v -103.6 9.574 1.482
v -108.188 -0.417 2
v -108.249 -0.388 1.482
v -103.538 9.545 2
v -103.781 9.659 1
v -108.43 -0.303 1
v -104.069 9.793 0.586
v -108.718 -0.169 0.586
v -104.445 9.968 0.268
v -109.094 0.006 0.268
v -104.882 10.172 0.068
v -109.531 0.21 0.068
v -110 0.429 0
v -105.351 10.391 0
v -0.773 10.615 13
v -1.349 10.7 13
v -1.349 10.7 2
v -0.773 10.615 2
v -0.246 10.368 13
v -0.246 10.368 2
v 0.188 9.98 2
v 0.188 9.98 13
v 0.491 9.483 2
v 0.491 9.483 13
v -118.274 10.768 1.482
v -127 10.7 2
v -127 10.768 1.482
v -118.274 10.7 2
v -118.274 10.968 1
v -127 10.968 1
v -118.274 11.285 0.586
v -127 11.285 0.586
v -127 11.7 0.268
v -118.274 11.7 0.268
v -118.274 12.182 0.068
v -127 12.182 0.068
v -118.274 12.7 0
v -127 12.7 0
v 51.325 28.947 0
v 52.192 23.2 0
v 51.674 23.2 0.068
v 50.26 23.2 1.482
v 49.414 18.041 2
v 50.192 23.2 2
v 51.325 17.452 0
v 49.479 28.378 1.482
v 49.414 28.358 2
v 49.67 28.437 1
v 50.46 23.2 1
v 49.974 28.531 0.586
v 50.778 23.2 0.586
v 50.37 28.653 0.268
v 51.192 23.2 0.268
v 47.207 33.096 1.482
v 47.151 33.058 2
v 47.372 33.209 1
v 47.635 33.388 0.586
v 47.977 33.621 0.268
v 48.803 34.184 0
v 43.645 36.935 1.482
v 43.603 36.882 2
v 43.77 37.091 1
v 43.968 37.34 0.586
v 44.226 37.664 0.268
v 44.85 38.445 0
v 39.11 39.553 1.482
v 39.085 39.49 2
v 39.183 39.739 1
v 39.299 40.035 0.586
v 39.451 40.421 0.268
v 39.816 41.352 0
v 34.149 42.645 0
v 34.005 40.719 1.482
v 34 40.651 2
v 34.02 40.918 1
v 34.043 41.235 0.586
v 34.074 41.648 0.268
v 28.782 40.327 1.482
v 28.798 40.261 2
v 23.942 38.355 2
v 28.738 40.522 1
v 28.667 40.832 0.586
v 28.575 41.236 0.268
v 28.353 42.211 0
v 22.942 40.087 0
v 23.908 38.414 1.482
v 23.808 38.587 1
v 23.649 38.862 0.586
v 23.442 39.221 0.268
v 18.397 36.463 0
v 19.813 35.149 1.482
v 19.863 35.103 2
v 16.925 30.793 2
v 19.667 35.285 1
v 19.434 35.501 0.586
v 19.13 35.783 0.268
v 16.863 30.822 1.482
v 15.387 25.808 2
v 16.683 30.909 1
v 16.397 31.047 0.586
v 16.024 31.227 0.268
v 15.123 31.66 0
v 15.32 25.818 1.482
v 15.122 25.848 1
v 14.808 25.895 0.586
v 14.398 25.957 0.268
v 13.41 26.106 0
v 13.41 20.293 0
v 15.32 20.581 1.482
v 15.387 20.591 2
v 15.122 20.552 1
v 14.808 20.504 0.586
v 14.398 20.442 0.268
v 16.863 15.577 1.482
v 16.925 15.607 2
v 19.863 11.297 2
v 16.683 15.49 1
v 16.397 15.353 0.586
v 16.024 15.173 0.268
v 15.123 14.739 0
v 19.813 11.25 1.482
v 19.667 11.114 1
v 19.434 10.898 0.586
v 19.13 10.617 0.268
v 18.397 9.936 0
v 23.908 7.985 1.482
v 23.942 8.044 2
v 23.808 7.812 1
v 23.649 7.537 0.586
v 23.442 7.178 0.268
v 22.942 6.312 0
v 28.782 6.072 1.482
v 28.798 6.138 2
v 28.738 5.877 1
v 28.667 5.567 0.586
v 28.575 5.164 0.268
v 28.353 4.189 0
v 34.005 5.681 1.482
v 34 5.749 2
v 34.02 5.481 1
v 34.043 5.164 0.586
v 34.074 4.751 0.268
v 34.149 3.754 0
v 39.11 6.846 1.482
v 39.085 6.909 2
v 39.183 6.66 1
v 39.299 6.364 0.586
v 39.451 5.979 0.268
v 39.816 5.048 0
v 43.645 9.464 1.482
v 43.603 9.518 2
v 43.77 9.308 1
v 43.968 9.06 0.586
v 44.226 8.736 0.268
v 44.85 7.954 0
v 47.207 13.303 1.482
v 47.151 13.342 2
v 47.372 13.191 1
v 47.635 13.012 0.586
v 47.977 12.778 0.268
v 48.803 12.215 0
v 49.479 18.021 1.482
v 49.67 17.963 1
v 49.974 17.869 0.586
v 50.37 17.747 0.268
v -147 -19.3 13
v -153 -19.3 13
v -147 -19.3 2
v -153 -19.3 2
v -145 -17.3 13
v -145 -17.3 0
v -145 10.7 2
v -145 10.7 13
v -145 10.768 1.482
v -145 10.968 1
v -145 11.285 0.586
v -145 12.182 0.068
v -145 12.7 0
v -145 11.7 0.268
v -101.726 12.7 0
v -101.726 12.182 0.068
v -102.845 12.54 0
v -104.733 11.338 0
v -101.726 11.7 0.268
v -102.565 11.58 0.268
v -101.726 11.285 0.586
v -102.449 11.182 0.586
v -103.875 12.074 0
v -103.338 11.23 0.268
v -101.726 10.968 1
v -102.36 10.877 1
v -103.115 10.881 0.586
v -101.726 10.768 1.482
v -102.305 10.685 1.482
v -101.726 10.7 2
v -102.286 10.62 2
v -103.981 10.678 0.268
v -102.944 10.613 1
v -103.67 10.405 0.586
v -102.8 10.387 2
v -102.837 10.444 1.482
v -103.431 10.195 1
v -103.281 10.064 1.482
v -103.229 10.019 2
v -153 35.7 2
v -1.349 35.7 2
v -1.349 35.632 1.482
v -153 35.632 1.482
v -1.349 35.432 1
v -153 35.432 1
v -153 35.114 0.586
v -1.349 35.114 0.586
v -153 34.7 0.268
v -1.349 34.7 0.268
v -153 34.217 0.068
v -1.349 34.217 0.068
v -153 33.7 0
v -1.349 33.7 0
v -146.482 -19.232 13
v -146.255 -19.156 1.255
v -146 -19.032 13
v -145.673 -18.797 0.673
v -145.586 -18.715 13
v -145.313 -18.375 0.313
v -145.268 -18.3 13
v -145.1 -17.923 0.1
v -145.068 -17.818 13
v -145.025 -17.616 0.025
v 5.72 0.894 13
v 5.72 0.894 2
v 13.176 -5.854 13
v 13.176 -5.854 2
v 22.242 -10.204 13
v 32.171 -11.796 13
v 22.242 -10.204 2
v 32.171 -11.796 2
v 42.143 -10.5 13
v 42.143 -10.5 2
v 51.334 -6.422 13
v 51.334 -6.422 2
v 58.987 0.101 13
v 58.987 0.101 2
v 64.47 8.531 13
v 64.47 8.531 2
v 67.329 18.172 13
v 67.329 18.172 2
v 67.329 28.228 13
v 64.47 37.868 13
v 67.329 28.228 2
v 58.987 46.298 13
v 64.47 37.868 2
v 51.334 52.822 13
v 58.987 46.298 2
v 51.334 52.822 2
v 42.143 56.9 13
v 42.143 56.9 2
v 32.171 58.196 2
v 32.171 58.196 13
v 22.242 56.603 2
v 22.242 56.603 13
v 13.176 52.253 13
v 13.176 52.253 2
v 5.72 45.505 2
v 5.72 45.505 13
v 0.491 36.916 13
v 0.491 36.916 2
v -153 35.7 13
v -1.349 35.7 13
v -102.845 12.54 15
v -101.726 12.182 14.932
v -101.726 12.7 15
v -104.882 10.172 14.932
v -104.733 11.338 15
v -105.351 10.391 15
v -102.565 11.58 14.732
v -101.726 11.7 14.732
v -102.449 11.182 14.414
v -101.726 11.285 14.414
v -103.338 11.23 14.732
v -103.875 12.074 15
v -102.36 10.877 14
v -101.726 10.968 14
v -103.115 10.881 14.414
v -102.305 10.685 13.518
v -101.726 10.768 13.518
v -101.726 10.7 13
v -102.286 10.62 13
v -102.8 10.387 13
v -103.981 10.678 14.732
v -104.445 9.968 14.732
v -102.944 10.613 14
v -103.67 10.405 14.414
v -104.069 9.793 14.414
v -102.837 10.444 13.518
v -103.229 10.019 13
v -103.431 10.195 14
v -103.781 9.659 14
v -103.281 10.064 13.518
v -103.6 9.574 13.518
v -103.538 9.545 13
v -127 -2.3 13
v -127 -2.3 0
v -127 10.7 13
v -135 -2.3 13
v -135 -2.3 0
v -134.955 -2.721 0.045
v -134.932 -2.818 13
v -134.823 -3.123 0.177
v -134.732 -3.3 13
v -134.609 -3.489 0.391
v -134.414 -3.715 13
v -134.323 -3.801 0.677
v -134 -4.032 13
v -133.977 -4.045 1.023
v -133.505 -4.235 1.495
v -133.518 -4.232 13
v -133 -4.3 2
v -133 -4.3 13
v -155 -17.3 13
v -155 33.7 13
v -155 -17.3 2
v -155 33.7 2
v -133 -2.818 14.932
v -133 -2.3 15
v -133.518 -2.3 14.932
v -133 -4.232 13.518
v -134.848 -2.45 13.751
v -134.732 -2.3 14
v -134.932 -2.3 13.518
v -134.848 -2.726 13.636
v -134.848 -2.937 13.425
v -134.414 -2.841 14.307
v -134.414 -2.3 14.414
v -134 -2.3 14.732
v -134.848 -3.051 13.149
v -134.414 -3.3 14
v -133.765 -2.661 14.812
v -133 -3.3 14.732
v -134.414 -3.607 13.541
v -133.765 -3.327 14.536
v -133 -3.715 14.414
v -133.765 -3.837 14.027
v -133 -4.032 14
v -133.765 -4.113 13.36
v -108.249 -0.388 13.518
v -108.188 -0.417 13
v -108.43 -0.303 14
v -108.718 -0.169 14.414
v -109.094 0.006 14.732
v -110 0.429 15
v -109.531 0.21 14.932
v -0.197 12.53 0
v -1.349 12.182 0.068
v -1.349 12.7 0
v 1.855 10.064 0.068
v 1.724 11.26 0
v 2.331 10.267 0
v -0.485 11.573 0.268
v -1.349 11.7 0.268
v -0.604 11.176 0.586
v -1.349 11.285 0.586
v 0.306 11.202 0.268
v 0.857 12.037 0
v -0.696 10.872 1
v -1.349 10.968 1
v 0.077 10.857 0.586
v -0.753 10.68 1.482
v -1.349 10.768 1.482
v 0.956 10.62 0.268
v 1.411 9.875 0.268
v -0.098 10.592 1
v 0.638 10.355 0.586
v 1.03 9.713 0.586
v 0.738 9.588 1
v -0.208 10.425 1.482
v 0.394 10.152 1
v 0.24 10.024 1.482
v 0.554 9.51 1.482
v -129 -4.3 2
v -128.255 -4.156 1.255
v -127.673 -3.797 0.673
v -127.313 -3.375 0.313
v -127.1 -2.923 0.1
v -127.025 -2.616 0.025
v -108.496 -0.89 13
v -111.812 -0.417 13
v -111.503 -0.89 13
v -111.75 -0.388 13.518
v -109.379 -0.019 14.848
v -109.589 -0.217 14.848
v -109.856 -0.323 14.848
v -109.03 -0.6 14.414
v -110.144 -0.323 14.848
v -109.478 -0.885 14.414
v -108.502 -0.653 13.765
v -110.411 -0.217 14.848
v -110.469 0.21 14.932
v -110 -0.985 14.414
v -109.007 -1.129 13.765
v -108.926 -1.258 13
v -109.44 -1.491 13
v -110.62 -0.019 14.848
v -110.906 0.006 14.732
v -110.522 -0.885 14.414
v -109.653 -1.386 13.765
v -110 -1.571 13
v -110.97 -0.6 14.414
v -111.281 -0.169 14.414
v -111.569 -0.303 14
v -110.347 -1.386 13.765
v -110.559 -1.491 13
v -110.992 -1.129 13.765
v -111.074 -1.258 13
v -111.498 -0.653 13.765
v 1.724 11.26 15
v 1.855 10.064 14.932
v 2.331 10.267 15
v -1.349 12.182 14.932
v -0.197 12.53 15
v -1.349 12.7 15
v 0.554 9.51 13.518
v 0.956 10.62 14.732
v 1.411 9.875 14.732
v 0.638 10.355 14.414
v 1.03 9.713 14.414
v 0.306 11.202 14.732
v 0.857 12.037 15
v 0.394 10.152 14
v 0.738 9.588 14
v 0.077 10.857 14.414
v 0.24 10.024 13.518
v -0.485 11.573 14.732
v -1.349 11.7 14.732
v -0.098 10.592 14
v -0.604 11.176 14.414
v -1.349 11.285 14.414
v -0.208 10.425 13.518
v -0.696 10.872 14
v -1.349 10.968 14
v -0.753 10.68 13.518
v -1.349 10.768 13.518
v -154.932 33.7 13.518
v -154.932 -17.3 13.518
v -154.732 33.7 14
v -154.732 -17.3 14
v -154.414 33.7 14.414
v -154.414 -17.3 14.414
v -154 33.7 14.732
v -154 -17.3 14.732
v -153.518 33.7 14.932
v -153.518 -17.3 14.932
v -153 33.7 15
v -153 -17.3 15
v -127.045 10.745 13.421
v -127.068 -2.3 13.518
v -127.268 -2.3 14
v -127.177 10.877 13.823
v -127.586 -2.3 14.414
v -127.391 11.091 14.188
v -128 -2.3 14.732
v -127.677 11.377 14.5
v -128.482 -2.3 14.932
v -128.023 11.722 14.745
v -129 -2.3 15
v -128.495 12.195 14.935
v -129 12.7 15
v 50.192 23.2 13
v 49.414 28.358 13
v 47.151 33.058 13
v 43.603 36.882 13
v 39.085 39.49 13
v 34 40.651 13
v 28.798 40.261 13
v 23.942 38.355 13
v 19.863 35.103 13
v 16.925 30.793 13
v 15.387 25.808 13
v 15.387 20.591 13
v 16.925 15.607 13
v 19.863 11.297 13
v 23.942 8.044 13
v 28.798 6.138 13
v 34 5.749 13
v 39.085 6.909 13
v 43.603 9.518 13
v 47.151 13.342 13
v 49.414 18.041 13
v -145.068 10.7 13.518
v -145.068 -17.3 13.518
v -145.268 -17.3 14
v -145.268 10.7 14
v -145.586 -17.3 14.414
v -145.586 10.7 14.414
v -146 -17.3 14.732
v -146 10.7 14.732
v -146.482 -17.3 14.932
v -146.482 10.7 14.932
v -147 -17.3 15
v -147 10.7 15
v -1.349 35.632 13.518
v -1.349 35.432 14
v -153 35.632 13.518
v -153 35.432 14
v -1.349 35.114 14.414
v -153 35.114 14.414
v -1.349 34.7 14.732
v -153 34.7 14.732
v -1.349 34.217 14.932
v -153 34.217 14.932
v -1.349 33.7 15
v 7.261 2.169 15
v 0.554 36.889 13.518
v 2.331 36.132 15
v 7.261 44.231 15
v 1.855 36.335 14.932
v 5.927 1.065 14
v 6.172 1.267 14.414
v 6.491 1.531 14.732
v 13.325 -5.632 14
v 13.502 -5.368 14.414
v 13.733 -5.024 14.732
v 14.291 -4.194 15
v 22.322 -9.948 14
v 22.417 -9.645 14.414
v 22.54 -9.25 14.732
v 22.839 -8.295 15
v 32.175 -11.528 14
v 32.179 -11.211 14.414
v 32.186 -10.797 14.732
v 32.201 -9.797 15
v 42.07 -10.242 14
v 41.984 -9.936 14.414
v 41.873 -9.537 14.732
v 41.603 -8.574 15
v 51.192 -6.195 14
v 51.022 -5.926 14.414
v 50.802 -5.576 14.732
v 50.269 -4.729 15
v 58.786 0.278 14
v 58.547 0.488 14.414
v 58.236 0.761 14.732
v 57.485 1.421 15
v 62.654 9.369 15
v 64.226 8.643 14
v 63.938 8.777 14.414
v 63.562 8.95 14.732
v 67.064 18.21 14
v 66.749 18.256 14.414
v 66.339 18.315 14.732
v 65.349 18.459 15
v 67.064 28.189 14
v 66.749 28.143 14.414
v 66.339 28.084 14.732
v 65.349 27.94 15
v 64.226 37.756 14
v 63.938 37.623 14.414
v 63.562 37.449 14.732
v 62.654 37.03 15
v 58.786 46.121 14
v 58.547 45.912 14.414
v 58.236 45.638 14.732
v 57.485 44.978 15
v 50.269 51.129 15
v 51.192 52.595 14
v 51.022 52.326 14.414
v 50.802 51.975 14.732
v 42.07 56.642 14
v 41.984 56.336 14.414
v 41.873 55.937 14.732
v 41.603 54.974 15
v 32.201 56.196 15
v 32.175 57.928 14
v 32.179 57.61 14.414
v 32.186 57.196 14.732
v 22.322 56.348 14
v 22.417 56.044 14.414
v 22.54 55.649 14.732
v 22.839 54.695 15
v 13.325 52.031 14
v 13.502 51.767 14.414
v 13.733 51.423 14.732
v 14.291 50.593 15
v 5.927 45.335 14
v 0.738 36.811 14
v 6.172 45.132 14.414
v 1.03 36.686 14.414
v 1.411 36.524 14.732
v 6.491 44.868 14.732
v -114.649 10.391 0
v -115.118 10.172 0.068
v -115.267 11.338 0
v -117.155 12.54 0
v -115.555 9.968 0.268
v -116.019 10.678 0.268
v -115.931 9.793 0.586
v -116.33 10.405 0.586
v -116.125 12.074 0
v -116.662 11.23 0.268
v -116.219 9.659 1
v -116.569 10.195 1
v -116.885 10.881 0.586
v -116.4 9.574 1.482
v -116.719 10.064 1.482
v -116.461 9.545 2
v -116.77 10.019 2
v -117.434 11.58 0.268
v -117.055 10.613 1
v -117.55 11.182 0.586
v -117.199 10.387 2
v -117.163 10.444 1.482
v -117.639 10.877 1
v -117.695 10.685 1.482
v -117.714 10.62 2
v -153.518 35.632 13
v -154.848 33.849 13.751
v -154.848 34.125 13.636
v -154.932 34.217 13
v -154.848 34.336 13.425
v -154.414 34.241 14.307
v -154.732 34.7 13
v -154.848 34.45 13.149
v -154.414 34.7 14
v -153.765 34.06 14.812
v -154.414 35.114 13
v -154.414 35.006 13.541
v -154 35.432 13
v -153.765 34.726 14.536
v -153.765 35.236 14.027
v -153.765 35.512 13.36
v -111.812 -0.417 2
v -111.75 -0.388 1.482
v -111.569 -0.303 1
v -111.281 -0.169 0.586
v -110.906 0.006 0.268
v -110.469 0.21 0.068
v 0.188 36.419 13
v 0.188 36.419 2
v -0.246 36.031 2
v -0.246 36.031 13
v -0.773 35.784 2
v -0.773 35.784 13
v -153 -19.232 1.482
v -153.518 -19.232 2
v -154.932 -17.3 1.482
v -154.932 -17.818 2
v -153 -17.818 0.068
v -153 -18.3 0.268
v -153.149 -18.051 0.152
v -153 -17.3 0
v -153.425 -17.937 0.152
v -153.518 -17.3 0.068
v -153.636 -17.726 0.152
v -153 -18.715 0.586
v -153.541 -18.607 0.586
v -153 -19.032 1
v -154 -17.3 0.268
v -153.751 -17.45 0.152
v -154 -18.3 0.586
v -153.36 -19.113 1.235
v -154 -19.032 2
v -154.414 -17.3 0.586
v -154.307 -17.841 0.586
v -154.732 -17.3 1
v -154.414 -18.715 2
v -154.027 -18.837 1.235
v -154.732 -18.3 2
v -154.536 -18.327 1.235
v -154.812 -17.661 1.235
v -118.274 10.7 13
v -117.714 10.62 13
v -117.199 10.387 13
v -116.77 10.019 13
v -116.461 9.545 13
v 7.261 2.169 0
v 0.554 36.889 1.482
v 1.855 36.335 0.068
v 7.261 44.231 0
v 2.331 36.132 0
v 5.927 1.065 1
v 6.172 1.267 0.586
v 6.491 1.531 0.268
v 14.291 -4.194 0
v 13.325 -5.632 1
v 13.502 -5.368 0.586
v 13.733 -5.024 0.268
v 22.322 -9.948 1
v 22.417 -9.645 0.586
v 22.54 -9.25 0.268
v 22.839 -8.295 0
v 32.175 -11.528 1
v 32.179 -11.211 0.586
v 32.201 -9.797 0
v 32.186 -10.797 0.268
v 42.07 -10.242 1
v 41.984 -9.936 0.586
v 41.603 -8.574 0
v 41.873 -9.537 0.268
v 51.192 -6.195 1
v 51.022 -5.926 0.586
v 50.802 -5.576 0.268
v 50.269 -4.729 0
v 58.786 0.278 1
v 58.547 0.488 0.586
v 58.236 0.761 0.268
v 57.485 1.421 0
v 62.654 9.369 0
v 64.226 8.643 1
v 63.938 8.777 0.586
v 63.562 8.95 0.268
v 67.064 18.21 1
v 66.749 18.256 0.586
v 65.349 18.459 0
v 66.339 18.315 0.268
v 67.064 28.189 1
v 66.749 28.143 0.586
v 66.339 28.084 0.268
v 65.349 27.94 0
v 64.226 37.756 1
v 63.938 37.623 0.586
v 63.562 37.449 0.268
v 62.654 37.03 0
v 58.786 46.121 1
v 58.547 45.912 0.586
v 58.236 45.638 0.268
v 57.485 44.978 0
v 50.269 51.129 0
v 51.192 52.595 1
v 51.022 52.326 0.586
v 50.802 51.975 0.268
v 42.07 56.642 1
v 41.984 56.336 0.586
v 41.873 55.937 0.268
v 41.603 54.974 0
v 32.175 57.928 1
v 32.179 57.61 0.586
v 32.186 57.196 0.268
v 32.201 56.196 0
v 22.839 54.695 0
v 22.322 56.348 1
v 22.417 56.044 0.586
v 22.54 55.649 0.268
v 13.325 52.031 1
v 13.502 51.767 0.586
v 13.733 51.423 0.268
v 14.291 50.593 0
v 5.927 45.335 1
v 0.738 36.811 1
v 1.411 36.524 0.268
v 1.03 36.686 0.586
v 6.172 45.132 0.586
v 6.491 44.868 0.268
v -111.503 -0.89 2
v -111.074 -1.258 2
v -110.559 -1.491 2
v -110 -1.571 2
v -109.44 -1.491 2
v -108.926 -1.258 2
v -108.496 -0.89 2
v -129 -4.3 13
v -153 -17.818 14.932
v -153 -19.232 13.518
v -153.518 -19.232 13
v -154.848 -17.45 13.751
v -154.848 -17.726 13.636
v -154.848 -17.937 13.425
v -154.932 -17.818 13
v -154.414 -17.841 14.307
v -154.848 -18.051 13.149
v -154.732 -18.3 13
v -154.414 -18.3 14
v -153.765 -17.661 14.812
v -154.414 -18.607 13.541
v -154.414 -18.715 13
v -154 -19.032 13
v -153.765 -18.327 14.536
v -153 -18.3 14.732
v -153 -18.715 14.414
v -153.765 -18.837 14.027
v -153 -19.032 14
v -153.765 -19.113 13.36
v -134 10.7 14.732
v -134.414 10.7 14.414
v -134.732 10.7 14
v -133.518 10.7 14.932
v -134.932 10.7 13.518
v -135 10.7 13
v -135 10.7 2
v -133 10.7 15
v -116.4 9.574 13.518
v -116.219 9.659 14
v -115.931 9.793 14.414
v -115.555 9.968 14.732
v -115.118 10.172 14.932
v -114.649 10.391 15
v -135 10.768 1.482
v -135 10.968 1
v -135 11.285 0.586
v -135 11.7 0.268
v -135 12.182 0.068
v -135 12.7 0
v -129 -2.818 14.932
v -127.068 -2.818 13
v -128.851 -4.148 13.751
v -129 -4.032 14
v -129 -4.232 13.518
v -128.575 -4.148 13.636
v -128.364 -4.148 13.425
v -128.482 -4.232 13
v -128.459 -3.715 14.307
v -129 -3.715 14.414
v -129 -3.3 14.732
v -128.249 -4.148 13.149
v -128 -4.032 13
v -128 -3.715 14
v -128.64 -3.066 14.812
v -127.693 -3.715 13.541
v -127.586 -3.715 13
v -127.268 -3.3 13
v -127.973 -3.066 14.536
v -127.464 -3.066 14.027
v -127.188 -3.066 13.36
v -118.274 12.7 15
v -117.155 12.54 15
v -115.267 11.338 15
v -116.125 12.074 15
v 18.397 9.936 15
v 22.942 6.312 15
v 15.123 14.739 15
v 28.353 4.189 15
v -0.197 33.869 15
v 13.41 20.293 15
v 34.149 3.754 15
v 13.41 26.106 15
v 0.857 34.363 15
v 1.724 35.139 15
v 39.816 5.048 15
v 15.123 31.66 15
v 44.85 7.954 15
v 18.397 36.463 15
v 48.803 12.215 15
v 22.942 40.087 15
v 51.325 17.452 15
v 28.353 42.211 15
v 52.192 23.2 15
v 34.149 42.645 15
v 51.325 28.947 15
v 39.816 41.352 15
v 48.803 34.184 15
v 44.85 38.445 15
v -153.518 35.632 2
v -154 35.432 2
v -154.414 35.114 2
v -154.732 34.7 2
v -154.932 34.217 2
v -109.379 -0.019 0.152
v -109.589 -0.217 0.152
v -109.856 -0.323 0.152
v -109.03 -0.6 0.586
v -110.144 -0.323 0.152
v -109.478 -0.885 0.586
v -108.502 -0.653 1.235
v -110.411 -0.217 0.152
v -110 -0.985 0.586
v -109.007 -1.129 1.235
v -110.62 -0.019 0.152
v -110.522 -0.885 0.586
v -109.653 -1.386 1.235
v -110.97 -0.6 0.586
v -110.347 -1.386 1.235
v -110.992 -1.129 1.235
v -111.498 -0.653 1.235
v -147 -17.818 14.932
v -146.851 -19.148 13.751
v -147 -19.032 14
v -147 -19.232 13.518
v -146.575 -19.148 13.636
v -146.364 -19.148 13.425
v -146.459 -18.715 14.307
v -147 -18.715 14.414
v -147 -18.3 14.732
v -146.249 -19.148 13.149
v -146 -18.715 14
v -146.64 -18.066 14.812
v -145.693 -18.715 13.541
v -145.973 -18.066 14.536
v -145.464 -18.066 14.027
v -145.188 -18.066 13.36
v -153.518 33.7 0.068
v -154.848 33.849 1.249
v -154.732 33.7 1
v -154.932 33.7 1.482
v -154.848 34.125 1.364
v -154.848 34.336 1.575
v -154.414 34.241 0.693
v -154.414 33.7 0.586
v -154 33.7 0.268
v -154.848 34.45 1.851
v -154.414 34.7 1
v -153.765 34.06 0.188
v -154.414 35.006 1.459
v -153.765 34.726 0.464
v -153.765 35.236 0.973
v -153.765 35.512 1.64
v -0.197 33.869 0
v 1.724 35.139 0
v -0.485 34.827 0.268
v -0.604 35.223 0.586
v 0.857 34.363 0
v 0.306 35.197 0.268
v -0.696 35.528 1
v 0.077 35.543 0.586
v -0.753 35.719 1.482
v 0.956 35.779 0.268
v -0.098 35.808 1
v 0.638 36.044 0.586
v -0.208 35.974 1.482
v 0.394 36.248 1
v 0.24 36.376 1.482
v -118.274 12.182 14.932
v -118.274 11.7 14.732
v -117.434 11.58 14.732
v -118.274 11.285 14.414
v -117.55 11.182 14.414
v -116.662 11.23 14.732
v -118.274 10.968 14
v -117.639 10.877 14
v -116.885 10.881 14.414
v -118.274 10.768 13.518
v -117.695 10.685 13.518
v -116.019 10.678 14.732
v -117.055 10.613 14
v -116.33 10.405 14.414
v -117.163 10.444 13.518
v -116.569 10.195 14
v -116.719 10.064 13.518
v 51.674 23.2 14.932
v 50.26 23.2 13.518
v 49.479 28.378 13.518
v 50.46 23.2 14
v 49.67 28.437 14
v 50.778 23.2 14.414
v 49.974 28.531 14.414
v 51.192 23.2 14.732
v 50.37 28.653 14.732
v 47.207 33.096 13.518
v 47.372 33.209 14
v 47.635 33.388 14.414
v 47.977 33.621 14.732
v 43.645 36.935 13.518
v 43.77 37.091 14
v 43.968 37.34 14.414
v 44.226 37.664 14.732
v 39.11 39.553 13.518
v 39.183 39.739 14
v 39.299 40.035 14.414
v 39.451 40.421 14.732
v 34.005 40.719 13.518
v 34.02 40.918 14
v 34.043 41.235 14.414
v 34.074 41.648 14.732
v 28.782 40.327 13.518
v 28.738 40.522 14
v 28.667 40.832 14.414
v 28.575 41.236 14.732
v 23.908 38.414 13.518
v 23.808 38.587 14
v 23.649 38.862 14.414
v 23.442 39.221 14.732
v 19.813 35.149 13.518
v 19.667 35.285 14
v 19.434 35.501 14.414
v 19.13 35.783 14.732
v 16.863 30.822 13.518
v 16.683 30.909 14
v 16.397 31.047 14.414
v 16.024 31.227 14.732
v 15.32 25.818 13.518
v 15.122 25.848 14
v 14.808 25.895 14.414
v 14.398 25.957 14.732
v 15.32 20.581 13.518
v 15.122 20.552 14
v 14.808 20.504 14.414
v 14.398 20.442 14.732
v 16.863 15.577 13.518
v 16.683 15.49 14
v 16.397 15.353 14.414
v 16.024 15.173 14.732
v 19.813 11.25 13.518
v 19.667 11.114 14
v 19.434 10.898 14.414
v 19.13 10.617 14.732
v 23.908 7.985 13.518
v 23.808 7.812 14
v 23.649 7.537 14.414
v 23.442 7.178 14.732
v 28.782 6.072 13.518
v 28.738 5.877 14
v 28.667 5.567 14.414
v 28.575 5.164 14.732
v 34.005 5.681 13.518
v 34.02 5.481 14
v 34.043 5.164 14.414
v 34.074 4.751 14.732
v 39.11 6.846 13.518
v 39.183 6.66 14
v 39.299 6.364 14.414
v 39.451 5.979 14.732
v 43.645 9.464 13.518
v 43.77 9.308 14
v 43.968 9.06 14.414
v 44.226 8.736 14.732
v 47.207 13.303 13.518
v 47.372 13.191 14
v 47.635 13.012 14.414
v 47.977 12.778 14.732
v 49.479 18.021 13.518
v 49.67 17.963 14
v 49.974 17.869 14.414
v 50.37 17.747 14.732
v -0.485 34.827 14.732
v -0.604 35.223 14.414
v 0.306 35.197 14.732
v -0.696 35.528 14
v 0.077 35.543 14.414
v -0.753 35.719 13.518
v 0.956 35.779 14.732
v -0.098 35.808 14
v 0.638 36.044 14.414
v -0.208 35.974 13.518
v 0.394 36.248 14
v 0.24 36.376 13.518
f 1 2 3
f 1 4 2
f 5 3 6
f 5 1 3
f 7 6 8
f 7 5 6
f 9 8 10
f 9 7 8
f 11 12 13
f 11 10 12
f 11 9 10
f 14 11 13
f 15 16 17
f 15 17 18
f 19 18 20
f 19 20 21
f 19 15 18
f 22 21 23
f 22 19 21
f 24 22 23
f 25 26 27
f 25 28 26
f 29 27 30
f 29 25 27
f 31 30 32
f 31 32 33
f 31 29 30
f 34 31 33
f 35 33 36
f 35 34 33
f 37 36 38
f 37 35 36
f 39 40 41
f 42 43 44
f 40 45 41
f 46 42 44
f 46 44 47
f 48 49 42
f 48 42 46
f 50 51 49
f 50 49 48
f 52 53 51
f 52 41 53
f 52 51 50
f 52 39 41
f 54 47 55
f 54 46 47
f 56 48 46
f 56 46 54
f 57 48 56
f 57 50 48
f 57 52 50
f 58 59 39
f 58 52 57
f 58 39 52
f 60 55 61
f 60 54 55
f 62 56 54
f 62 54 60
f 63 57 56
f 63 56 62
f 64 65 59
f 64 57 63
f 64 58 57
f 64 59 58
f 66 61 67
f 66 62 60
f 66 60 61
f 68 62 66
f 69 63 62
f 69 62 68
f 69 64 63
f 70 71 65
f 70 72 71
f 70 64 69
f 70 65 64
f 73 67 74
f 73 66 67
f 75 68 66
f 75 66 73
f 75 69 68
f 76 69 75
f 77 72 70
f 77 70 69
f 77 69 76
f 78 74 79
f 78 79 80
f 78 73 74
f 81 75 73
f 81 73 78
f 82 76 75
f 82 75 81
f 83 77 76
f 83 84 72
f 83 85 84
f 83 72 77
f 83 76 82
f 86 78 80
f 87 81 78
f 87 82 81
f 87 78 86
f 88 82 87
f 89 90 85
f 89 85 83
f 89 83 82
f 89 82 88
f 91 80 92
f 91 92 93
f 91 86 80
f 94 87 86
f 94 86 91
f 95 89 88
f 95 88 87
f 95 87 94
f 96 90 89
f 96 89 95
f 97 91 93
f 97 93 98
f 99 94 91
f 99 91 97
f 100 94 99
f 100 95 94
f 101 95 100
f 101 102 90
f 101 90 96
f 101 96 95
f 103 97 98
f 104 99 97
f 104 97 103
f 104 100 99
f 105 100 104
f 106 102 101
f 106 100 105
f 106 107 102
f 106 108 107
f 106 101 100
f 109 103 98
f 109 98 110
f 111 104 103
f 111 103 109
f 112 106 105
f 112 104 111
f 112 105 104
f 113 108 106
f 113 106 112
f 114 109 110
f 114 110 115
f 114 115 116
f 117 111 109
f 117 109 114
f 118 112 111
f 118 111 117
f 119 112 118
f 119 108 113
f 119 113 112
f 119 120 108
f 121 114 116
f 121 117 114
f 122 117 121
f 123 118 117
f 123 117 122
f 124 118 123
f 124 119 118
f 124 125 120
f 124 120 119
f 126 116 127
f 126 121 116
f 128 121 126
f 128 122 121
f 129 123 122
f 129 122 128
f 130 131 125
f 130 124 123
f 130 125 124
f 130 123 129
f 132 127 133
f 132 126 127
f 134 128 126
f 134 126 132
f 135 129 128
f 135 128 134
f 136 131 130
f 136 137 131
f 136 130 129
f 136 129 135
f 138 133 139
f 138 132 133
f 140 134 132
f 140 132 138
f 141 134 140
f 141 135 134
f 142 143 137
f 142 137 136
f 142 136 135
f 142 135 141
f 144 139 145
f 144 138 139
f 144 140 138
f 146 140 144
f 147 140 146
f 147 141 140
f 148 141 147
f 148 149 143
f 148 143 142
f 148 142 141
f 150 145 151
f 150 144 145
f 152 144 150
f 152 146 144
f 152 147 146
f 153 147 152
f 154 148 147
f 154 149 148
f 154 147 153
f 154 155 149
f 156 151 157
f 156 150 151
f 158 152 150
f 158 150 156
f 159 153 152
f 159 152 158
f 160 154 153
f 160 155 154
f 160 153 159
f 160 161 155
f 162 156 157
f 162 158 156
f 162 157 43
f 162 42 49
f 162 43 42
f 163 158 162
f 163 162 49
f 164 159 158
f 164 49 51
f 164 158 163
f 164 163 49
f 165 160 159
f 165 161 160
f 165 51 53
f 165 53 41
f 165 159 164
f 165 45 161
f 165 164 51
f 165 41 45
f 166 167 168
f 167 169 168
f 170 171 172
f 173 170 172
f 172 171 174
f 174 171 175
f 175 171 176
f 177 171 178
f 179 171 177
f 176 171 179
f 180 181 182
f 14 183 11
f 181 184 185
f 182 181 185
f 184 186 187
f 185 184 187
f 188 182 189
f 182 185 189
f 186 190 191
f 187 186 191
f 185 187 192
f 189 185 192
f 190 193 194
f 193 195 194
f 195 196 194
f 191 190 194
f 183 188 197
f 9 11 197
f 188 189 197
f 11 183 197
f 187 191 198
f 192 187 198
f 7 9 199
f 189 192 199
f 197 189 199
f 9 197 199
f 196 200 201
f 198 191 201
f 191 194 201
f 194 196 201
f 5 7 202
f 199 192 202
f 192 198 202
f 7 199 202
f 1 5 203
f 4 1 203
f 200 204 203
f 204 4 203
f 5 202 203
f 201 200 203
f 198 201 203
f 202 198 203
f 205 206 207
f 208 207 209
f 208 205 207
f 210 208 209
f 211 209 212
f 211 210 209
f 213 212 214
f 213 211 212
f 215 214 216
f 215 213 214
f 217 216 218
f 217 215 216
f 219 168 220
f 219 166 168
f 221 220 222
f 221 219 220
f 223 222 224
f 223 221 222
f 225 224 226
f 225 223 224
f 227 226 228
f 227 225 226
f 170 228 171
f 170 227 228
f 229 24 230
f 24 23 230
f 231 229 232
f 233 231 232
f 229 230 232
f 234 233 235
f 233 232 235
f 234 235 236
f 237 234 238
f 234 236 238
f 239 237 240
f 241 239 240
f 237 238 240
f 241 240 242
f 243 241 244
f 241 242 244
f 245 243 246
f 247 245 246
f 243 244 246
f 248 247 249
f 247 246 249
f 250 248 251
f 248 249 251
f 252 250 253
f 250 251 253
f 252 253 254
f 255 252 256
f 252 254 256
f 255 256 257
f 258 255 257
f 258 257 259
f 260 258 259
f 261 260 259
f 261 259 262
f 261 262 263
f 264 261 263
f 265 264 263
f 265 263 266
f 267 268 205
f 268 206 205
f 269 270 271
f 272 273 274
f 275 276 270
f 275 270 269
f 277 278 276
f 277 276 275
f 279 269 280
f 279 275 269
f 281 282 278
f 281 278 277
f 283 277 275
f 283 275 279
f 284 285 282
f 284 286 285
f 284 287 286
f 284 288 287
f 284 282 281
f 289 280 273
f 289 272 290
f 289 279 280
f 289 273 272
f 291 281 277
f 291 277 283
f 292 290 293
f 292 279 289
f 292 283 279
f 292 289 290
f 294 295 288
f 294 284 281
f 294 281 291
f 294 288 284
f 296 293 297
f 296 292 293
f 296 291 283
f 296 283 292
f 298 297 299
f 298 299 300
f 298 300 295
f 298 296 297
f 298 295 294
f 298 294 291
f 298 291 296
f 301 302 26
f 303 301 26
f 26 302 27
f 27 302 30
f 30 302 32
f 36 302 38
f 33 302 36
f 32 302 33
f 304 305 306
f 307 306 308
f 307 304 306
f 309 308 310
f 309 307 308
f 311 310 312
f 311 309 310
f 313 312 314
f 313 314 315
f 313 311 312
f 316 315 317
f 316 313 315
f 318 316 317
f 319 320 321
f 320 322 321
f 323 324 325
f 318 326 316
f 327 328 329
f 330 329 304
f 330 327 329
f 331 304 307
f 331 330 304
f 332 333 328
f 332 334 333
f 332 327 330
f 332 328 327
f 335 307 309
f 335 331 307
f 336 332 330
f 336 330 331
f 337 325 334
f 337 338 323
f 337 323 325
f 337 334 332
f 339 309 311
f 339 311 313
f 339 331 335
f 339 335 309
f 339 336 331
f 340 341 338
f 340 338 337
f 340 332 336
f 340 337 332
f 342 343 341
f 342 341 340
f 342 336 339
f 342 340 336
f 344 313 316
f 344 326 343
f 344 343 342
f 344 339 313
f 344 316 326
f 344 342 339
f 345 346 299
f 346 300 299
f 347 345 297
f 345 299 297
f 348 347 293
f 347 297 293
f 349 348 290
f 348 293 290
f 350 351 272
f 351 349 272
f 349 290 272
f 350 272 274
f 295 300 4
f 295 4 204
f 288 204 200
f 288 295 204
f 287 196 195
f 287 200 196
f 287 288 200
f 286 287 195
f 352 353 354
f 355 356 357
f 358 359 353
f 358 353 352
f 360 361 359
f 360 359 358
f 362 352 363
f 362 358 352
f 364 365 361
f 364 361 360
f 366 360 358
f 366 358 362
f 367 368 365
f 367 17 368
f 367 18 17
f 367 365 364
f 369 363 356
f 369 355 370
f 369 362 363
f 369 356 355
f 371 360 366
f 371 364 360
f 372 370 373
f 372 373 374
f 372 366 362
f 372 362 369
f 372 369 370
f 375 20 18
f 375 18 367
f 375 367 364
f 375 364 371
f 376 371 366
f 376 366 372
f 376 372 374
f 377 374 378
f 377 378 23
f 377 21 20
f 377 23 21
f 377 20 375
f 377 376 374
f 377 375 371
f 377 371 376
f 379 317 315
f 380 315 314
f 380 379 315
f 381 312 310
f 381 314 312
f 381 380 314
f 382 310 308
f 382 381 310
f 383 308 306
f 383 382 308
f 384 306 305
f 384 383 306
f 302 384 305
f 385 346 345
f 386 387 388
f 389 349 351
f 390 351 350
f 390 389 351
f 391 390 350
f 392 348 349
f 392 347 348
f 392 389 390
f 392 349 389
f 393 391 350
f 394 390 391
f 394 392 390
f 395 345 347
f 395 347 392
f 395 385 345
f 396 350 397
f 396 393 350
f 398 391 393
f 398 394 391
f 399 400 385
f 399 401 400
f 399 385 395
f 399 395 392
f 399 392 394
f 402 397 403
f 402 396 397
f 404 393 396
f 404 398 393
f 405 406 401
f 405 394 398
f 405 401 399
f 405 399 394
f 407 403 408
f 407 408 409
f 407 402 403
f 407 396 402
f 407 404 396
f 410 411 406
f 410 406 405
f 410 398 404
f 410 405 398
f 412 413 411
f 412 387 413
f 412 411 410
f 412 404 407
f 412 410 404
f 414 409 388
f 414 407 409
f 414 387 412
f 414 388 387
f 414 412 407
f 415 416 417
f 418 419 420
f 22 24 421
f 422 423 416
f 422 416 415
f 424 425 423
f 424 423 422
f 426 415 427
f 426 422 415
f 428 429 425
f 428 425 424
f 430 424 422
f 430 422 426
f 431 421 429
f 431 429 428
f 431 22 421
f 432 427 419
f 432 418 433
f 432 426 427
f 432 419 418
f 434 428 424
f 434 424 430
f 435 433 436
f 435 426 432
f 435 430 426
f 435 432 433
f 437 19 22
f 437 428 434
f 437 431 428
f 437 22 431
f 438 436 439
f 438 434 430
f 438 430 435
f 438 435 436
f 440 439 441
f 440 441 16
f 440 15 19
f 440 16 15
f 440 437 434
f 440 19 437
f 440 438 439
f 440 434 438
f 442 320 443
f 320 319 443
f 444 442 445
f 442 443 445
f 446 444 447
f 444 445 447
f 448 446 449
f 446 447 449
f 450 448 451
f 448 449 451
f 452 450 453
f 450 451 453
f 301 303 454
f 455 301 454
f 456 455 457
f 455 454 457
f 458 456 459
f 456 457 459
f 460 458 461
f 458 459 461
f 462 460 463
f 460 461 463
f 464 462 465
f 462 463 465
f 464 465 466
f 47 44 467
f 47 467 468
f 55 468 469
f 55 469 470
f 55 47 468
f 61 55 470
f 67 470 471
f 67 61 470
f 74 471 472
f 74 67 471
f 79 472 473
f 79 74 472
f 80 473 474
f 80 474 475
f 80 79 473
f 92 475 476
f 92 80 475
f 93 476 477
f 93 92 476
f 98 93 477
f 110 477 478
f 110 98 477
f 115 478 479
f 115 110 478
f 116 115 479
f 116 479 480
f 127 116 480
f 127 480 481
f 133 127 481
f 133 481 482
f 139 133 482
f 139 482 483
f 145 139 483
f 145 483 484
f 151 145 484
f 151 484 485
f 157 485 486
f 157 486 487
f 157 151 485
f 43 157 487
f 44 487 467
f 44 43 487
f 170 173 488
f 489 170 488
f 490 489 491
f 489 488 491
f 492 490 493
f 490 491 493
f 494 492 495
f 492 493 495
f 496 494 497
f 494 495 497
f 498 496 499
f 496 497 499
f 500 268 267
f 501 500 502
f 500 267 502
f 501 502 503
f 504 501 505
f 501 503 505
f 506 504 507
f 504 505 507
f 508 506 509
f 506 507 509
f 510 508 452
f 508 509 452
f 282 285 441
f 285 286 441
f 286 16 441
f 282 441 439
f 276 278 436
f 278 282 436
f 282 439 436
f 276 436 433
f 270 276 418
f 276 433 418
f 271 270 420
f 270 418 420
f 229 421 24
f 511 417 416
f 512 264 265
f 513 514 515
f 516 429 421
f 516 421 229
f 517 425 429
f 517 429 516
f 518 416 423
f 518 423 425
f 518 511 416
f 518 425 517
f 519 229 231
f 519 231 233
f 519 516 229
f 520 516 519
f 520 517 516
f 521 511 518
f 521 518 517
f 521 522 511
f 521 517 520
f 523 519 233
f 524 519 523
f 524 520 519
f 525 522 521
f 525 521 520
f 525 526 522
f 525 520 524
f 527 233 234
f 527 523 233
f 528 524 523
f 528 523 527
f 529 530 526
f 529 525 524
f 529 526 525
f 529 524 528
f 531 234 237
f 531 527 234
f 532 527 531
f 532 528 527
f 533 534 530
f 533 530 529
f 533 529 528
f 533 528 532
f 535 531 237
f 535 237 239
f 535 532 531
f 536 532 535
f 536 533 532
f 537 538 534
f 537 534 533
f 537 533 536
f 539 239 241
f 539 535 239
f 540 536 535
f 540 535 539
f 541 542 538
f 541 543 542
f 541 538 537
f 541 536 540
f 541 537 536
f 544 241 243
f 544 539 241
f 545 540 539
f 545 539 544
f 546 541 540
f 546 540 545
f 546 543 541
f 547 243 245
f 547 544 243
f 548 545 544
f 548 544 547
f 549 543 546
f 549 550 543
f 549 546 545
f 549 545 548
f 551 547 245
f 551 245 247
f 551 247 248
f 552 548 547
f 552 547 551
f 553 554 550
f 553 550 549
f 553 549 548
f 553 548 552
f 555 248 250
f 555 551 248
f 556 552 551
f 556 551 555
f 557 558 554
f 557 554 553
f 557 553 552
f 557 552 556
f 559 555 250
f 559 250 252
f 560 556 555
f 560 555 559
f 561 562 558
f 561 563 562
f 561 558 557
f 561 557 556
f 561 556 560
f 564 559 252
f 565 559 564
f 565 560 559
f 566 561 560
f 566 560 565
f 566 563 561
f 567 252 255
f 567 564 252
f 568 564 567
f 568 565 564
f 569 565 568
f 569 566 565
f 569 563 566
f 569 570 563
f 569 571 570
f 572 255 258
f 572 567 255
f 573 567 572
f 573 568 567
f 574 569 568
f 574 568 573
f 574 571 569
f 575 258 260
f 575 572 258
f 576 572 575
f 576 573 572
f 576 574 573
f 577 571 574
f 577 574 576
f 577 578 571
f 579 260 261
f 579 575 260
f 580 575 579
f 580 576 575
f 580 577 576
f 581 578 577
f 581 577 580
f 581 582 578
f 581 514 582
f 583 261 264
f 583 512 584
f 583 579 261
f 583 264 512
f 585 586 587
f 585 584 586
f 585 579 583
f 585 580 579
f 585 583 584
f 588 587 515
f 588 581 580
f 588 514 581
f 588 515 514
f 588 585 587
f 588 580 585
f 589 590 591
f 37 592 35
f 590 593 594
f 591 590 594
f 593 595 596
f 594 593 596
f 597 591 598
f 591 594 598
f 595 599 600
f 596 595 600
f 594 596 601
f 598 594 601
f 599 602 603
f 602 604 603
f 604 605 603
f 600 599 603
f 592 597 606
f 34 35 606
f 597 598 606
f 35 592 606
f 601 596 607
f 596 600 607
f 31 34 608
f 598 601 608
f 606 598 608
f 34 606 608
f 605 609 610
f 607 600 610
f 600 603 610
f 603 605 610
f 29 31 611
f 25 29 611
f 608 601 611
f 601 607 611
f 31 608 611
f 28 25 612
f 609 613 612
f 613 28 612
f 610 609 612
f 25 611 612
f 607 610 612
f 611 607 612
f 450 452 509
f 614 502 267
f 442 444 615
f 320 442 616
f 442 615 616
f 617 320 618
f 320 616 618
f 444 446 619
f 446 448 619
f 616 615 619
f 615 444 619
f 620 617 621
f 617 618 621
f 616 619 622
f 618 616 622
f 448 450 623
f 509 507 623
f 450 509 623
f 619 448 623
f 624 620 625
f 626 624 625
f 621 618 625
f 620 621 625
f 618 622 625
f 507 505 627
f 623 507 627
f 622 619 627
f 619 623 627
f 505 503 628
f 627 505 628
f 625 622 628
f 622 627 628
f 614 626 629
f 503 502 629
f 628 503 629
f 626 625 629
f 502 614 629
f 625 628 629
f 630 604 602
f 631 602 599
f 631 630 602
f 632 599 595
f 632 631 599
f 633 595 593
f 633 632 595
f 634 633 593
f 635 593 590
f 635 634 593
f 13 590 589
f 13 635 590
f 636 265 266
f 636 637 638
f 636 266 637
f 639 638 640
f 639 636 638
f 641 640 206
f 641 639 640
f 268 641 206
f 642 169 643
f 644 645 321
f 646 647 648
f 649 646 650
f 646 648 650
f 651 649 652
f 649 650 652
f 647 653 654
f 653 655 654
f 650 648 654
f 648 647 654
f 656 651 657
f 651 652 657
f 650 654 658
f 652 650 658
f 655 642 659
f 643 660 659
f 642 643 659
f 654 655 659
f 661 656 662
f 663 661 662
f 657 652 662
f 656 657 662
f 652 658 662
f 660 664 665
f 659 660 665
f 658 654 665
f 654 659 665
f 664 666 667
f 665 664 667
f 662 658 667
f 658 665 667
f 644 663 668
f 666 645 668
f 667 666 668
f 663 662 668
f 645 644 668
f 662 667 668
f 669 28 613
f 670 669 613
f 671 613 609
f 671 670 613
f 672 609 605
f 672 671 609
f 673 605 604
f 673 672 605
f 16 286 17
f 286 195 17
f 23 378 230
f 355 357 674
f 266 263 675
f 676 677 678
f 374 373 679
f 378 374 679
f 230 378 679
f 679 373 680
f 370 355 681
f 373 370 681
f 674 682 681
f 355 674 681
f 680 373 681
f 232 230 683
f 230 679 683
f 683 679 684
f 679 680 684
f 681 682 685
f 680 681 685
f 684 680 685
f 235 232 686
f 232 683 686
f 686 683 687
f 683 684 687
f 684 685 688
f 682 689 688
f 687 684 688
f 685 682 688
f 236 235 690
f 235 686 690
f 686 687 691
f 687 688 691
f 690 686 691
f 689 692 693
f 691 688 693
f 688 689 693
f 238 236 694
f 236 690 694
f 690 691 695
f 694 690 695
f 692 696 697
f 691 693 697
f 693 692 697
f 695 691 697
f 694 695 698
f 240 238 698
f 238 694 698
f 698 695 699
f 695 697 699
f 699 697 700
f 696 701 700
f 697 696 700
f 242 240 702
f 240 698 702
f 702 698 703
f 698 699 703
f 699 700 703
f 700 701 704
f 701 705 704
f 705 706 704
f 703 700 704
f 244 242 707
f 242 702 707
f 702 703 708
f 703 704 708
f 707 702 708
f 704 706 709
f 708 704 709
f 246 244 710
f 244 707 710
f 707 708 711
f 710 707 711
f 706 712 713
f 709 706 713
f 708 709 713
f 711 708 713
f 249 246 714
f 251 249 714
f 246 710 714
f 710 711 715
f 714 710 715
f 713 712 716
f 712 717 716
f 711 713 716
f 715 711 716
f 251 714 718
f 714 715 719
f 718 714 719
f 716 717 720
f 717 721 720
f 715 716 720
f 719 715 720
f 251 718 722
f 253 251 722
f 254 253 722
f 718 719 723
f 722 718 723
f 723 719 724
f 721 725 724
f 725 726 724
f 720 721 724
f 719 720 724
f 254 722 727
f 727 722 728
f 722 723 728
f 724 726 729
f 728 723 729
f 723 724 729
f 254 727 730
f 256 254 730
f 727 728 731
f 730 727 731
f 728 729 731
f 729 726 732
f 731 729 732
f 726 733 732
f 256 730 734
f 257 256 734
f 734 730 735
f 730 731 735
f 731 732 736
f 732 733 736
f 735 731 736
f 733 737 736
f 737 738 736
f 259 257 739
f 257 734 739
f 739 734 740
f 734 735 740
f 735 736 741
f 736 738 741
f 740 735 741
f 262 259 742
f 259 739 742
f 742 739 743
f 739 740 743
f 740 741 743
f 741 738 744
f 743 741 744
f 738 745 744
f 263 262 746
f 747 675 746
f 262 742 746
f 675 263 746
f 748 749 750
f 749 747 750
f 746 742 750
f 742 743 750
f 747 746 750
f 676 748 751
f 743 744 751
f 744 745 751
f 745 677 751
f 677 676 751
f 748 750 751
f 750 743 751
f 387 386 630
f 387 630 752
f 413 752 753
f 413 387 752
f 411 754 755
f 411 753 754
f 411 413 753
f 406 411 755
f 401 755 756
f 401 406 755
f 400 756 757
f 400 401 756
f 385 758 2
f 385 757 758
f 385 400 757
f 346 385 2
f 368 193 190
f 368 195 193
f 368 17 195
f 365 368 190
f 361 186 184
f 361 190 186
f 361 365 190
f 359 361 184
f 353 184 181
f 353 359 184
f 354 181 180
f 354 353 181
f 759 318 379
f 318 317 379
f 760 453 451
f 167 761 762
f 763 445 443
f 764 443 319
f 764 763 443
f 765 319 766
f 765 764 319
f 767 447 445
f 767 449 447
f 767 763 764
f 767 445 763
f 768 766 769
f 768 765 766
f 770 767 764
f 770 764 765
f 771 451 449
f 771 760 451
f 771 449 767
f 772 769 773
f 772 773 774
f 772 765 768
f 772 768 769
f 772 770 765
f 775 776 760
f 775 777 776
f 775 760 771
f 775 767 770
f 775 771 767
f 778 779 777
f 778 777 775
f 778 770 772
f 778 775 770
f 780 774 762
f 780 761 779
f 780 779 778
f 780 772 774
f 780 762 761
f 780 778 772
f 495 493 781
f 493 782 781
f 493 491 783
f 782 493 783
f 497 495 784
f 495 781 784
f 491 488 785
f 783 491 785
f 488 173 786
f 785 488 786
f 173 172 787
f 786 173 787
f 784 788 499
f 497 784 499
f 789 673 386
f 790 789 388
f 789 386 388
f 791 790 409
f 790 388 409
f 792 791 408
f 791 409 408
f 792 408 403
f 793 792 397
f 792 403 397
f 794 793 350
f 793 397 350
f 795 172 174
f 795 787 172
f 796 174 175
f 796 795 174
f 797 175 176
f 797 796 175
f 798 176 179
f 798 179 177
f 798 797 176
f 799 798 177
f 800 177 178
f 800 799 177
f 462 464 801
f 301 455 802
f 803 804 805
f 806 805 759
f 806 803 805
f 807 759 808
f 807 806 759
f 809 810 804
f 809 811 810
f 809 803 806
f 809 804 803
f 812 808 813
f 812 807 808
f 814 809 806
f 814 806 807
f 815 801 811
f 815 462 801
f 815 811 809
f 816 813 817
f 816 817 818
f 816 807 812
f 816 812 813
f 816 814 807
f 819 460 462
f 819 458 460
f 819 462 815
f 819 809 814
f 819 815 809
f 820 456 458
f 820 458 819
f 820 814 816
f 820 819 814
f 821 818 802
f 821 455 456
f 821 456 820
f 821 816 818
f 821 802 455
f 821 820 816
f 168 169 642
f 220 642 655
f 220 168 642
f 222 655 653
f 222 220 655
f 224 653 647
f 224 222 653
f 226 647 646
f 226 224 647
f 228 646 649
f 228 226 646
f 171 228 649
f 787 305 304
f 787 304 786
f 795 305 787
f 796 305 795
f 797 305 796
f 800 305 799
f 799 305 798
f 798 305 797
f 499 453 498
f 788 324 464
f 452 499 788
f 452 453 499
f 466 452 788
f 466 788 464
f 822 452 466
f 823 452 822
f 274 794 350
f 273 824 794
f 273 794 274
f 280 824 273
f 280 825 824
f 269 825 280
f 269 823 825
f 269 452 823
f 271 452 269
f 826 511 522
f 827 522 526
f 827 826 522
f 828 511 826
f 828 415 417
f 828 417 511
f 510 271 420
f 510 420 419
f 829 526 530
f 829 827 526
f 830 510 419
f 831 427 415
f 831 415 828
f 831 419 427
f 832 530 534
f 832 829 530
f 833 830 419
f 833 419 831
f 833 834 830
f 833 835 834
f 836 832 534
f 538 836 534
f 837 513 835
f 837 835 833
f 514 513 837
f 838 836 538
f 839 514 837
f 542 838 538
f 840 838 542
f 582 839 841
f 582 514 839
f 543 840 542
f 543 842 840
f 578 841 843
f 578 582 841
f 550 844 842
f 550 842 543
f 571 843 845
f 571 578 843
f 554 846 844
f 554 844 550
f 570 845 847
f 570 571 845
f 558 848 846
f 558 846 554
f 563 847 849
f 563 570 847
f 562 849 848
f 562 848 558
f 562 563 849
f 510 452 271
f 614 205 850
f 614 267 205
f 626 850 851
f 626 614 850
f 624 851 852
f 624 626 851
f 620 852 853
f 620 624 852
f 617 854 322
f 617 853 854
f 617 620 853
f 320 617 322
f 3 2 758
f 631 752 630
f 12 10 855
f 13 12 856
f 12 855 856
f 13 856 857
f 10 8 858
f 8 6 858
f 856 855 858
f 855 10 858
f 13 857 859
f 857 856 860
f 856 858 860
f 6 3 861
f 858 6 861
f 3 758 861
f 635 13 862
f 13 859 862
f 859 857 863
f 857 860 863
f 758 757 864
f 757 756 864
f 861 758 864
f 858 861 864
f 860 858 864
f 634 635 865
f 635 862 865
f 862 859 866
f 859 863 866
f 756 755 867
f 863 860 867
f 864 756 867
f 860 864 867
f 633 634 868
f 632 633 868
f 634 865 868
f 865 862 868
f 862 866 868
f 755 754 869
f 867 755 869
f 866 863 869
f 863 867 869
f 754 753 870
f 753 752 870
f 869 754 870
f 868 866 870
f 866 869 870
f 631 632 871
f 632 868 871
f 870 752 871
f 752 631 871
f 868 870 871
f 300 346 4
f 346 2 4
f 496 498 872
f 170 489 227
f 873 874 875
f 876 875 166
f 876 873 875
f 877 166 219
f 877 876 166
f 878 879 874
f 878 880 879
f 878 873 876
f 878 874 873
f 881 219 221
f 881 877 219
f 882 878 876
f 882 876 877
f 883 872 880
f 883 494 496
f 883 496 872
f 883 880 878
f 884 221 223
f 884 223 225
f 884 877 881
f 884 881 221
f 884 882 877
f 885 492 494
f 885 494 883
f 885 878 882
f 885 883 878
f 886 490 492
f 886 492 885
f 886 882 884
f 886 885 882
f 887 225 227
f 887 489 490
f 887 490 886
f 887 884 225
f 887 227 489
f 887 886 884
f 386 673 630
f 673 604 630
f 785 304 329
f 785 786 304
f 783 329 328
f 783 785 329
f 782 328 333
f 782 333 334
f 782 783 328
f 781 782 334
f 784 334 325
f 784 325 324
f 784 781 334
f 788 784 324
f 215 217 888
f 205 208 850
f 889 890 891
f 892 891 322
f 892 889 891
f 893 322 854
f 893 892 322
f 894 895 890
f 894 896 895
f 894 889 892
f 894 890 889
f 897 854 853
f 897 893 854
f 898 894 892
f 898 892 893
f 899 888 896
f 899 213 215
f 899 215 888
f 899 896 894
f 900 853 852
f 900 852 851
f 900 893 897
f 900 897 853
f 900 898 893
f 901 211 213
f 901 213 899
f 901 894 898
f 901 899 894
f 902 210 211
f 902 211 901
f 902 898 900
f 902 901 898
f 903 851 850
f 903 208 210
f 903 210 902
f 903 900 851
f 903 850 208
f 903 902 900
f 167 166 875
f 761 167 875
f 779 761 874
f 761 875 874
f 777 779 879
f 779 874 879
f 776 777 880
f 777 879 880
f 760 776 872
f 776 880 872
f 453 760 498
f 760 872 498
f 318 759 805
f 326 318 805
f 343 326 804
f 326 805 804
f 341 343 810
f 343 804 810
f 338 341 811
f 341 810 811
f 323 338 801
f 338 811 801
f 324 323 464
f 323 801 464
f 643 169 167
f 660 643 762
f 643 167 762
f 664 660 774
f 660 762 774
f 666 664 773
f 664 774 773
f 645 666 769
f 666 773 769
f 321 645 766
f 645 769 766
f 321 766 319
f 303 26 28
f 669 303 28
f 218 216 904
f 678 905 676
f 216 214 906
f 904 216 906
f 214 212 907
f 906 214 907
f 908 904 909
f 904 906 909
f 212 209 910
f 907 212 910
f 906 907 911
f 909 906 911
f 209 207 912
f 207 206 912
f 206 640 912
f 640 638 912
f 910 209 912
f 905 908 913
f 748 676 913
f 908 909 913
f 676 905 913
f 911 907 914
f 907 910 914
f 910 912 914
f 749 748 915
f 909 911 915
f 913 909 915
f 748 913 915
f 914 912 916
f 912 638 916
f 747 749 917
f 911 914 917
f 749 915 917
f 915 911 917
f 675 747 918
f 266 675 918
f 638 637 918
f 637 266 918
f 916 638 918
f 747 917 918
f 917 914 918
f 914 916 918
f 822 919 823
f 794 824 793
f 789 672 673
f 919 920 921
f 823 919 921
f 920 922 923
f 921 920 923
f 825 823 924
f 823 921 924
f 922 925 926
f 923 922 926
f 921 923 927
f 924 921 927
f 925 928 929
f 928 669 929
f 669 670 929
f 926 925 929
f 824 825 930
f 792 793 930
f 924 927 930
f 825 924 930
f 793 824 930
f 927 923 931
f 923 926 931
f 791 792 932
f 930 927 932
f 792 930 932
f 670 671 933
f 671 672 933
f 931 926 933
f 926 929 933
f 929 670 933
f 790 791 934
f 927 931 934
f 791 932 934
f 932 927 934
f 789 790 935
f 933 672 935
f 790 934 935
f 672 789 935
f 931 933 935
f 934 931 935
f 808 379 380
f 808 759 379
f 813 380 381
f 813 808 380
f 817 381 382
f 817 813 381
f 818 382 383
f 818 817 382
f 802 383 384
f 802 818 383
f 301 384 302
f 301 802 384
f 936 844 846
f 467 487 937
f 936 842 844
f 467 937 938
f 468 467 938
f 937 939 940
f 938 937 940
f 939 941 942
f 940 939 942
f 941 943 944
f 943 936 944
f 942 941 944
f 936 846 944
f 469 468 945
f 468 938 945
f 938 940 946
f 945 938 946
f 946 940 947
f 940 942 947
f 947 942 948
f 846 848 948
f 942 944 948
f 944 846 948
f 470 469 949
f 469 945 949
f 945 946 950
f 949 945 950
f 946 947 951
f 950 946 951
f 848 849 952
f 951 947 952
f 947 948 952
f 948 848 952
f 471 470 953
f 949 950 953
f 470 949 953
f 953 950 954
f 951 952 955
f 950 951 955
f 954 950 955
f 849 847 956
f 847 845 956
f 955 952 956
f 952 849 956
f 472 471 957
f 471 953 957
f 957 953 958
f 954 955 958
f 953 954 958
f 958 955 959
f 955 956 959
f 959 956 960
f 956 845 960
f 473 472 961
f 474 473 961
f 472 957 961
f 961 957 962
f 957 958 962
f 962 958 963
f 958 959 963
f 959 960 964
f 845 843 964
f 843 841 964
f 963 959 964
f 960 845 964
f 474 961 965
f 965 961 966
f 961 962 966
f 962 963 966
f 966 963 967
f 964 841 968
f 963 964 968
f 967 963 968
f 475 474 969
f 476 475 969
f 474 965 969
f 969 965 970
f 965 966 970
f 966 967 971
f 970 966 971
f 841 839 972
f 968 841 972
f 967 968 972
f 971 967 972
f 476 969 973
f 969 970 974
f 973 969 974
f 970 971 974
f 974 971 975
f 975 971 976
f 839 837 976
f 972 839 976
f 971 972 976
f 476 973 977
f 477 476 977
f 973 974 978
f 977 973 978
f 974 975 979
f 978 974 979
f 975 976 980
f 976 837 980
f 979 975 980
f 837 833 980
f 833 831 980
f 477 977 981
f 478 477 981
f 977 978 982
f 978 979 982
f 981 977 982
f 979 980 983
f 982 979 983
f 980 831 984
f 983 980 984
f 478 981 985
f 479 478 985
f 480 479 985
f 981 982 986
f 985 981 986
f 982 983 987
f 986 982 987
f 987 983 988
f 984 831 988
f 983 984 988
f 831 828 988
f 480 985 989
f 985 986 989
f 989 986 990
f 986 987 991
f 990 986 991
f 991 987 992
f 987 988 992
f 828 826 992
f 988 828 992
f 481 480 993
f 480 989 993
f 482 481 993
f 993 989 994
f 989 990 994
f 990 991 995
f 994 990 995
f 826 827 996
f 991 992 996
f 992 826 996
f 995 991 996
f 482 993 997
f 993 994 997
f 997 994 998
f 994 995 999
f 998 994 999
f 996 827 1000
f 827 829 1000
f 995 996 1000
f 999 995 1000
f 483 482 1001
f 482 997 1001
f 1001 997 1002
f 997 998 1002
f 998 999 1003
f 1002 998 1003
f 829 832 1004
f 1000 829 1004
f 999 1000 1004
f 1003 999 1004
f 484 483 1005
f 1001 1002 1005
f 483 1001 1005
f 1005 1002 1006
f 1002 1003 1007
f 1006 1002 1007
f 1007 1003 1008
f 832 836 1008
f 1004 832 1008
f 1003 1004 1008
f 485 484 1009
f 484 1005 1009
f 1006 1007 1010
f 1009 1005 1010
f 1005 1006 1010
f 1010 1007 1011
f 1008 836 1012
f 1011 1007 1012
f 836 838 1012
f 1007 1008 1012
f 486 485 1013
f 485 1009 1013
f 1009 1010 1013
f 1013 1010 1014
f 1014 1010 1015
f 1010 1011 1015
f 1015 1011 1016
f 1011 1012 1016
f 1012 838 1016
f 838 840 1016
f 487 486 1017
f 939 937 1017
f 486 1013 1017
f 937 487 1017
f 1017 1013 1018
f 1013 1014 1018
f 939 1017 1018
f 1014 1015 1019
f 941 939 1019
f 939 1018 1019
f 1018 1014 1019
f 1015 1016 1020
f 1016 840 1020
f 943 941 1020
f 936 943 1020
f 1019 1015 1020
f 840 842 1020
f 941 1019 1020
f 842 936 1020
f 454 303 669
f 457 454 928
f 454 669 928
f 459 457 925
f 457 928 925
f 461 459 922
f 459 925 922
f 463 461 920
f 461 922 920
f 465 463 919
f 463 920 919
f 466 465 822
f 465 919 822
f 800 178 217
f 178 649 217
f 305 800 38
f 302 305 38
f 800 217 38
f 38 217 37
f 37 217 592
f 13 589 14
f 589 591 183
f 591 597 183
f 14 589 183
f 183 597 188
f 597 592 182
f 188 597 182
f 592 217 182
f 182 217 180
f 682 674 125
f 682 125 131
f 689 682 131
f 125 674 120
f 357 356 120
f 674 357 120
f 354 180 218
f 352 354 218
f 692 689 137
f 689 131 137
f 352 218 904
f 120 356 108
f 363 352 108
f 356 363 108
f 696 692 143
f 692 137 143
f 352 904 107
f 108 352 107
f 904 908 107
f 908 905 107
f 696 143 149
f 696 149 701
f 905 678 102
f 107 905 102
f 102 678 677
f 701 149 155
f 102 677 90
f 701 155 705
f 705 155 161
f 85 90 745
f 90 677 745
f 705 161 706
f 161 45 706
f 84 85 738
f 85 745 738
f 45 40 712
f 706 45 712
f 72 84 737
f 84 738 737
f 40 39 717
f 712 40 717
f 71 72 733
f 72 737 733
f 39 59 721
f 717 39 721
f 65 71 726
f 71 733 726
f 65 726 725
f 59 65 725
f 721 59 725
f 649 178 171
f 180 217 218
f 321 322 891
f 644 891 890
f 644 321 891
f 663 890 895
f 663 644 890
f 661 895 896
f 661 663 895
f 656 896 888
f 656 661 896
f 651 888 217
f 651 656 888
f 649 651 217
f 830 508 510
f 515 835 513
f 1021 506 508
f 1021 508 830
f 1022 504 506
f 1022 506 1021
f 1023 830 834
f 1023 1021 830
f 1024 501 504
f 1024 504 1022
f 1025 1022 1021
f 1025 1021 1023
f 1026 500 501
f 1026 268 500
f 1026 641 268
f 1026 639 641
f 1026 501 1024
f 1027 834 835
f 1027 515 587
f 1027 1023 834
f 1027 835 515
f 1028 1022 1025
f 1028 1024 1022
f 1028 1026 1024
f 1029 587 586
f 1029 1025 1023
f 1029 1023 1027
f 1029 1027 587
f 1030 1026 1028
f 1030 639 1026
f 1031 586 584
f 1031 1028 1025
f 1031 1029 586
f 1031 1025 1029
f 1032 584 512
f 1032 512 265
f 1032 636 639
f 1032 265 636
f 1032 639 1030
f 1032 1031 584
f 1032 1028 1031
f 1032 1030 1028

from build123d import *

# Parameters (mm, degrees)
F0_W     = 10
F0_H     = 30
F0_W_2   = 8
F0_H_2   = 15
F0_R     = 17.5
F1_DEPTH = 15
F2_R     = 2


with BuildPart() as f1:
    # F0 (on Top) → F1 (new body)
    with BuildSketch(Plane.XY):
        with Locations((-150, -4.3002969027)):
            Rectangle(F0_W, F0_H)
        with Locations((-131, 3.1997030973)):
            Rectangle(F0_W_2, F0_H_2)
        Polygon((-109.9998707869, -4.3002969027), (-102.9997415738, 10.6997030973), (-117, 10.6997030973), align=None)
        with BuildLine():
            Line((0, 35.6997030973), (0, 10.6997030973))
            ThreePointArc((0, 10.6997030973), (67.6917420766, 23.1997030973), (0, 35.6997030973))
        make_face()
        with Locations((32.6917420766, 23.1997030973)):
            Circle(F0_R, mode=Mode.SUBTRACT)
        Polygon((-102.9997415738, 10.6997030973), (0, 10.6997030973), (0, 35.6997030973), (-155, 35.6997030973), (-155, 10.6997030973), (-145, 10.6997030973), (-135, 10.6997030973), (-127, 10.6997030973), (-117, 10.6997030973), align=None)
    extrude(amount=F1_DEPTH)

    # F2
    f2_edges = [f1.edges().sort_by_distance(p)[0] for p in [
        (-77.5, 35.699703, 15),
        (67.691742, 23.199703, 15),
        (15.191742, 23.199703, 15),
        (-51.499871, 10.699703, 15),
        (-106.499806, 3.199703, 15),
        (-113.499935, 3.199703, 15),
        (-127, 3.199703, 15),
        (-131, -4.300297, 15),
        (-135, 3.199703, 15),
        (-145, -4.300297, 15),
        (-150, -19.300297, 15),
        (-155, 8.199703, 15),
        (-77.5, 35.699703, 0),
        (67.691742, 23.199703, 0),
        (15.191742, 23.199703, 0),
        (-102.999742, 10.699703, 7.5),
        (-109.999871, -4.300297, 7.5),
        (-117, 10.699703, 7.5),
        (-127, -4.300297, 7.5),
        (-145, -19.300297, 7.5),
        (-135, -4.300297, 7.5),
        (-155, -19.300297, 7.5),
        (0, 10.699703, 7.5),
        (-51.499871, 10.699703, 0),
        (-106.499806, 3.199703, 0),
        (-113.499935, 3.199703, 0),
        (-131, -4.300297, 0),
        (-150, -19.300297, 0),
        (-122, 10.699703, 0),
        (-140, 10.699703, 0),
        (-155, 8.199703, 0),
        (-155, 35.699703, 7.5),
        (0, 35.699703, 7.5),
        (-122, 10.699703, 15),
    ]]
    fillet(f2_edges, radius=F2_R)


solid = f1.part
